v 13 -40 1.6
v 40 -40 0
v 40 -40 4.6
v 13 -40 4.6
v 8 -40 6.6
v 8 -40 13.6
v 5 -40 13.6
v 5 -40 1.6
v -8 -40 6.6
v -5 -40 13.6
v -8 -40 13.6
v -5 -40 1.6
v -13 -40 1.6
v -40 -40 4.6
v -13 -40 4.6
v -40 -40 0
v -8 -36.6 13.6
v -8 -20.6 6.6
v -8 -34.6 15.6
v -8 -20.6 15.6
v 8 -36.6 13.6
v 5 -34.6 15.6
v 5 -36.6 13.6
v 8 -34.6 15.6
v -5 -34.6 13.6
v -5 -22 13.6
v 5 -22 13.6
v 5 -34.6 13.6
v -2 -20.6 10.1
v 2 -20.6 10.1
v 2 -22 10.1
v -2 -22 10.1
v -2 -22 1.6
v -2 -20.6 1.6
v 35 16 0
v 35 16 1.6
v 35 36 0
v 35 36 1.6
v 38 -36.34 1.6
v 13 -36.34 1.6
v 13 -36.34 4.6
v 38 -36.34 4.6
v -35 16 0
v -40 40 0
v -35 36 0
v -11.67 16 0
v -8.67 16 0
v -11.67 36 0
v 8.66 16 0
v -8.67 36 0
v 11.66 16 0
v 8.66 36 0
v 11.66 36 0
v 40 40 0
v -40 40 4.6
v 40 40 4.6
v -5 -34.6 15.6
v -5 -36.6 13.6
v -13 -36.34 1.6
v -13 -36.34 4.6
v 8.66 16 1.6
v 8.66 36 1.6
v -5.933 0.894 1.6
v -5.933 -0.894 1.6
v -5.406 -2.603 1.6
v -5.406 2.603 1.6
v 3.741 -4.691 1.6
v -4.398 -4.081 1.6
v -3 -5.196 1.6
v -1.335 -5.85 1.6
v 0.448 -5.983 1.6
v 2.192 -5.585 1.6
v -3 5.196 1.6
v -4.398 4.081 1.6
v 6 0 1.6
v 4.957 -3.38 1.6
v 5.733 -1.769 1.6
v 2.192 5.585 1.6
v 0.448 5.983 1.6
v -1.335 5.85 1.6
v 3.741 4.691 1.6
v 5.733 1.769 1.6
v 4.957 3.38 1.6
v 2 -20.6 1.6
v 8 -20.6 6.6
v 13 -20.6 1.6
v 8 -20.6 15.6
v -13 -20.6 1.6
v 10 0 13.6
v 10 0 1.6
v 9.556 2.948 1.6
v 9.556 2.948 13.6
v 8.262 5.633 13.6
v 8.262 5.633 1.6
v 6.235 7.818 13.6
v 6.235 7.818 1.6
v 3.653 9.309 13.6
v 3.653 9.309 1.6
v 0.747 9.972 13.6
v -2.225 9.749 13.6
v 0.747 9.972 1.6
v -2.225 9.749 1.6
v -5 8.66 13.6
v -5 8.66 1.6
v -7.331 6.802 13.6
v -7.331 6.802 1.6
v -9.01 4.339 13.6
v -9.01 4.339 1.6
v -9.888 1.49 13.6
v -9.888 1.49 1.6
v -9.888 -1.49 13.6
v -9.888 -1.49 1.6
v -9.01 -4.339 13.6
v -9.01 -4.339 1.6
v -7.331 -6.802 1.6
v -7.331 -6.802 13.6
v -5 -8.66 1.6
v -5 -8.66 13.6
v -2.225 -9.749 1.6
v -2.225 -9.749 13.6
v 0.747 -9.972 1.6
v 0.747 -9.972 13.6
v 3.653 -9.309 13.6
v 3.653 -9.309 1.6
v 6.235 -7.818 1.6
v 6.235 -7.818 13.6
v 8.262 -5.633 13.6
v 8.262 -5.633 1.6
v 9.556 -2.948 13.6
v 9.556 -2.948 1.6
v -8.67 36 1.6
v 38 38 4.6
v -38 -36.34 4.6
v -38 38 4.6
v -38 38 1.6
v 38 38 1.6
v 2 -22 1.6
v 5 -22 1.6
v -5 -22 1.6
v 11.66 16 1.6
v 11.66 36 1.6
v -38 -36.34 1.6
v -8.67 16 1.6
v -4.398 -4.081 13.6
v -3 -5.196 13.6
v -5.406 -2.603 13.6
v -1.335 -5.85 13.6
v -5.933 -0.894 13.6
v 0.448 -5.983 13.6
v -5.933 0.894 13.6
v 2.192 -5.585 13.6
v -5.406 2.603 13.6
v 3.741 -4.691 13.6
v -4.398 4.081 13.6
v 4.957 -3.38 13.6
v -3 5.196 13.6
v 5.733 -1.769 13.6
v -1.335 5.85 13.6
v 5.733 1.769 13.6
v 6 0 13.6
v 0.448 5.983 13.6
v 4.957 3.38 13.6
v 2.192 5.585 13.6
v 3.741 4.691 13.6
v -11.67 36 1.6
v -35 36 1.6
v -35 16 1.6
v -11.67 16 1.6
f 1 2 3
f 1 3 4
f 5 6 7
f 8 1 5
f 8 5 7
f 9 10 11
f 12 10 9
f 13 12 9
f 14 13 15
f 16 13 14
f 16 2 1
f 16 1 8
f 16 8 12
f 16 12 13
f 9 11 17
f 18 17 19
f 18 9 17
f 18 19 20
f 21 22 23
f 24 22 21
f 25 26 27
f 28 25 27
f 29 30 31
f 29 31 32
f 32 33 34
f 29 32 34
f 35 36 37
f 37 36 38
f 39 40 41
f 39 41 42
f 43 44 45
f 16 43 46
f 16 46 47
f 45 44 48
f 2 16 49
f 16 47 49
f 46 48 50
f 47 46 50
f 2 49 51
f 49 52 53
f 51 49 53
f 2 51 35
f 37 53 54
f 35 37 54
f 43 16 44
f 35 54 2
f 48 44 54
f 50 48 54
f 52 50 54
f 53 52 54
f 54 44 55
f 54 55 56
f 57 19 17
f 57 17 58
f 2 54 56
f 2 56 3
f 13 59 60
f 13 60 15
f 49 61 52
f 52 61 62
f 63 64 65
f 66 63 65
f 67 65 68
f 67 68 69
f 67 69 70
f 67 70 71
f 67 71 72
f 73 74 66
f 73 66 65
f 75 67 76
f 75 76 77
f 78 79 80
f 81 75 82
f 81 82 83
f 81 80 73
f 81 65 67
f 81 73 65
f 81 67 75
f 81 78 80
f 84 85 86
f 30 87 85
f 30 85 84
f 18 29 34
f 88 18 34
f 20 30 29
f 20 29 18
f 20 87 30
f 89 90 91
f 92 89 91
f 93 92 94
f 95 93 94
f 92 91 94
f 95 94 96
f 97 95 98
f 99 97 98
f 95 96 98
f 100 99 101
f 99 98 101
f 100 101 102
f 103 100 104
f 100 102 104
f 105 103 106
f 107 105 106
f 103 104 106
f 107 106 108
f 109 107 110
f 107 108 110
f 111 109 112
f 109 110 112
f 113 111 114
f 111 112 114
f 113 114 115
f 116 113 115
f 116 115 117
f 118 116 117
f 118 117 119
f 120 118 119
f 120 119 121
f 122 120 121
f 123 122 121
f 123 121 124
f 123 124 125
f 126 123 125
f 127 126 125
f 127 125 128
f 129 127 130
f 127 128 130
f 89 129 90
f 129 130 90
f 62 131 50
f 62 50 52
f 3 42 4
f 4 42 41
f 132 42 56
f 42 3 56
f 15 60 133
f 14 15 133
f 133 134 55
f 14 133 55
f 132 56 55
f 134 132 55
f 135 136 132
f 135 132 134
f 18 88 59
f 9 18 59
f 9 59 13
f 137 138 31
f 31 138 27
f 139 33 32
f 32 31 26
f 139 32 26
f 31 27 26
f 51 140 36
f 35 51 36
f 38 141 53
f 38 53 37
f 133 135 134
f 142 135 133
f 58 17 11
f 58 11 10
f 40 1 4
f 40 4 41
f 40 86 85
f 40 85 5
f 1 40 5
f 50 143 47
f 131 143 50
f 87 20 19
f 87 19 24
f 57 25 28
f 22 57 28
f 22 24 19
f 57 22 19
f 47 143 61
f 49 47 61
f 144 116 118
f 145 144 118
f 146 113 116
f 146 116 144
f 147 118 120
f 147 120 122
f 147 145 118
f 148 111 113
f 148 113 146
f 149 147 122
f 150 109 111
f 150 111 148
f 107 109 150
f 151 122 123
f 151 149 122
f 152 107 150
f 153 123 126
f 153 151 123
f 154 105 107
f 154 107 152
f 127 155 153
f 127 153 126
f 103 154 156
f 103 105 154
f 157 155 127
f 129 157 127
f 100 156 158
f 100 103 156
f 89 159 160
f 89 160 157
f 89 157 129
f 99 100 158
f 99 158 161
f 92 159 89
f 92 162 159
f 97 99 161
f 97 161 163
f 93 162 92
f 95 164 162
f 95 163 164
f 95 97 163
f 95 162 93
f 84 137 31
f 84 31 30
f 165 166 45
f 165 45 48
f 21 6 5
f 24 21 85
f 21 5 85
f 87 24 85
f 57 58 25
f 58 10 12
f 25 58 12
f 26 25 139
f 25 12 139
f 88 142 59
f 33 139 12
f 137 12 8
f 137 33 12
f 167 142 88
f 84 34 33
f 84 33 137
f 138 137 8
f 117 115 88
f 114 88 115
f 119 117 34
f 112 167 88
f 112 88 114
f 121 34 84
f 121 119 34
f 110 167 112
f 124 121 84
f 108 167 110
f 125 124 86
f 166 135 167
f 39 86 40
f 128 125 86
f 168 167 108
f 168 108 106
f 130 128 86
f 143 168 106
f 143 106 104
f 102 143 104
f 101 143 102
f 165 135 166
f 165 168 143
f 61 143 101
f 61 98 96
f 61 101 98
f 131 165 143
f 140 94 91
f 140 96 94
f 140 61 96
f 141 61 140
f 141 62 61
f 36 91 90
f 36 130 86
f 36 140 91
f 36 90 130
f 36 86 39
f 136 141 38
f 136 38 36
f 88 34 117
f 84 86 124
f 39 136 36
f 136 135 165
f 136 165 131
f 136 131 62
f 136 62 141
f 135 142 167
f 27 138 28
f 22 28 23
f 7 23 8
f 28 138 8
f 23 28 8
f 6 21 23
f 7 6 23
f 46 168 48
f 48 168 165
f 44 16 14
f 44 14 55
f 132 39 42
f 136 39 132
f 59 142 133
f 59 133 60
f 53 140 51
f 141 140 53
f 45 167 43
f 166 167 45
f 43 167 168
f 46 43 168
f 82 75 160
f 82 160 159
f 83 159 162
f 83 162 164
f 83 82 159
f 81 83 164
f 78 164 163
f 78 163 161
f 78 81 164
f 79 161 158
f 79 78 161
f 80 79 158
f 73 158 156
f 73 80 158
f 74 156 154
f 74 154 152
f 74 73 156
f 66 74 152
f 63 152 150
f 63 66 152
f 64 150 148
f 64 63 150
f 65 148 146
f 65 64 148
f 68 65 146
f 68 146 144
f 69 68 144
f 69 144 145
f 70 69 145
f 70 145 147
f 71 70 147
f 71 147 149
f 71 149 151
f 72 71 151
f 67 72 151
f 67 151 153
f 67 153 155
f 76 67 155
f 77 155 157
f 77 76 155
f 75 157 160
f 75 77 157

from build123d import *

# Parameters (mm, degrees)
SKETCH1_W           = 80
SKETCH1_H           = 80
BOSS_EXTRUDE1_DEPTH = 1.6
SKETCH2_R           = 10
SKETCH2_R_2         = 6
BOSS_EXTRUDE2_DEPTH = 12
SKETCH3_W           = 23.33
SKETCH3_H           = 20
SKETCH3_W_2         = 23.34
SKETCH3_W_3         = 17.33
CUT_EXTRUDE1_DEPTH  = 12
BOSS_EXTRUDE3_DEPTH = 12
SKETCH5_W           = 6
SKETCH5_H           = 1.4
BOSS_EXTRUDE4_DEPTH = 12
SKETCH6_W           = 16
SKETCH6_H           = 14
BOSS_EXTRUDE5_DEPTH = 2
CHAMFER1_SIZE       = 2
SKETCH7_W           = 4
SKETCH7_H           = 1.4
BOSS_EXTRUDE6_DEPTH = 3.5
CHAMFER2_SIZE       = 5
BOSS_EXTRUDE7_DEPTH = 3


with BuildPart() as part:
    # Sketch1 → Boss-Extrude1 (new body)
    with BuildSketch(Plane.XY):
        Rectangle(SKETCH1_W, SKETCH1_H)
    extrude(amount=BOSS_EXTRUDE1_DEPTH)

    # Sketch2 → Boss-Extrude2 (add)
    with BuildSketch(Plane.XY.offset(1.6)):
        Circle(SKETCH2_R)
        Circle(SKETCH2_R_2, mode=Mode.SUBTRACT)
    extrude(amount=BOSS_EXTRUDE2_DEPTH)

    # Sketch3 → Cut-Extrude1 (cut)
    with BuildSketch(Plane.XY.offset(1.6)):
        with Locations((-23.335, 26)):
            Rectangle(SKETCH3_W, SKETCH3_H)
        with Locations((23.33, 26)):
            Rectangle(SKETCH3_W_2, SKETCH3_H)
        with Locations((-0.005, 26)):
            Rectangle(SKETCH3_W_3, SKETCH3_H)
    extrude(amount=-CUT_EXTRUDE1_DEPTH, mode=Mode.SUBTRACT)

    # Sketch4 → Boss-Extrude3 (add)
    with BuildSketch(Plane.XY.offset(1.6)):
        Polygon((-5, -40), (-5, -25), (-5, -22), (-8, -22), (-8, -40), align=None)
        Polygon((5, -40), (5, -25), (5, -22), (8, -22), (8, -40), align=None)
    extrude(amount=BOSS_EXTRUDE3_DEPTH)

    # Sketch5 → Boss-Extrude4 (add)
    with BuildSketch(Plane.XY.offset(1.6)):
        with Locations((-5, -21.3)):
            Rectangle(SKETCH5_W, SKETCH5_H)
        with Locations((5, -21.3)):
            Rectangle(SKETCH5_W, SKETCH5_H)
    extrude(amount=BOSS_EXTRUDE4_DEPTH)

    # Sketch6 → Boss-Extrude5 (add)
    with BuildSketch(Plane.XY.offset(13.6)):
        with Locations((0, -27.6)):
            Rectangle(SKETCH6_W, SKETCH6_H)
    extrude(amount=BOSS_EXTRUDE5_DEPTH)

    # Chamfer1
    chamfer1_edges = [part.edges().sort_by_distance(p)[0] for p in [
        (6.5, -34.6, 13.6),
        (-6.5, -34.6, 13.6),
    ]]
    chamfer(chamfer1_edges, length=CHAMFER1_SIZE - 0.0001)  # a hair under: the kernel refuses the full size

    # Sketch7 → Boss-Extrude6 (add)
    with BuildSketch(Plane(origin=(0, 0, 13.6), x_dir=(-1, 0, 0), z_dir=(0, 0, -1))):
        with Locations((0, -21.3)):
            Rectangle(SKETCH7_W, SKETCH7_H)
    extrude(amount=BOSS_EXTRUDE6_DEPTH)

    # Chamfer2
    chamfer2_edges = [part.edges().sort_by_distance(p)[0] for p in [
        (8, -30.3, 1.6),
        (-8, -30.3, 1.6),
    ]]
    chamfer(chamfer2_edges, length=CHAMFER2_SIZE)

    # Sketch8 → Boss-Extrude7 (add)
    with BuildSketch(Plane.XY.offset(1.6)):
        Polygon((-13, -36.339774094), (-13, -40), (-40, -40), (-40, 40), (40, 40), (40, -40), (13, -40), (13, -36.339774094), (38, -36.339774094), (38, 38), (-38, 38), (-38, -36.339774094), align=None)
    extrude(amount=BOSS_EXTRUDE7_DEPTH)


solid = part.part
